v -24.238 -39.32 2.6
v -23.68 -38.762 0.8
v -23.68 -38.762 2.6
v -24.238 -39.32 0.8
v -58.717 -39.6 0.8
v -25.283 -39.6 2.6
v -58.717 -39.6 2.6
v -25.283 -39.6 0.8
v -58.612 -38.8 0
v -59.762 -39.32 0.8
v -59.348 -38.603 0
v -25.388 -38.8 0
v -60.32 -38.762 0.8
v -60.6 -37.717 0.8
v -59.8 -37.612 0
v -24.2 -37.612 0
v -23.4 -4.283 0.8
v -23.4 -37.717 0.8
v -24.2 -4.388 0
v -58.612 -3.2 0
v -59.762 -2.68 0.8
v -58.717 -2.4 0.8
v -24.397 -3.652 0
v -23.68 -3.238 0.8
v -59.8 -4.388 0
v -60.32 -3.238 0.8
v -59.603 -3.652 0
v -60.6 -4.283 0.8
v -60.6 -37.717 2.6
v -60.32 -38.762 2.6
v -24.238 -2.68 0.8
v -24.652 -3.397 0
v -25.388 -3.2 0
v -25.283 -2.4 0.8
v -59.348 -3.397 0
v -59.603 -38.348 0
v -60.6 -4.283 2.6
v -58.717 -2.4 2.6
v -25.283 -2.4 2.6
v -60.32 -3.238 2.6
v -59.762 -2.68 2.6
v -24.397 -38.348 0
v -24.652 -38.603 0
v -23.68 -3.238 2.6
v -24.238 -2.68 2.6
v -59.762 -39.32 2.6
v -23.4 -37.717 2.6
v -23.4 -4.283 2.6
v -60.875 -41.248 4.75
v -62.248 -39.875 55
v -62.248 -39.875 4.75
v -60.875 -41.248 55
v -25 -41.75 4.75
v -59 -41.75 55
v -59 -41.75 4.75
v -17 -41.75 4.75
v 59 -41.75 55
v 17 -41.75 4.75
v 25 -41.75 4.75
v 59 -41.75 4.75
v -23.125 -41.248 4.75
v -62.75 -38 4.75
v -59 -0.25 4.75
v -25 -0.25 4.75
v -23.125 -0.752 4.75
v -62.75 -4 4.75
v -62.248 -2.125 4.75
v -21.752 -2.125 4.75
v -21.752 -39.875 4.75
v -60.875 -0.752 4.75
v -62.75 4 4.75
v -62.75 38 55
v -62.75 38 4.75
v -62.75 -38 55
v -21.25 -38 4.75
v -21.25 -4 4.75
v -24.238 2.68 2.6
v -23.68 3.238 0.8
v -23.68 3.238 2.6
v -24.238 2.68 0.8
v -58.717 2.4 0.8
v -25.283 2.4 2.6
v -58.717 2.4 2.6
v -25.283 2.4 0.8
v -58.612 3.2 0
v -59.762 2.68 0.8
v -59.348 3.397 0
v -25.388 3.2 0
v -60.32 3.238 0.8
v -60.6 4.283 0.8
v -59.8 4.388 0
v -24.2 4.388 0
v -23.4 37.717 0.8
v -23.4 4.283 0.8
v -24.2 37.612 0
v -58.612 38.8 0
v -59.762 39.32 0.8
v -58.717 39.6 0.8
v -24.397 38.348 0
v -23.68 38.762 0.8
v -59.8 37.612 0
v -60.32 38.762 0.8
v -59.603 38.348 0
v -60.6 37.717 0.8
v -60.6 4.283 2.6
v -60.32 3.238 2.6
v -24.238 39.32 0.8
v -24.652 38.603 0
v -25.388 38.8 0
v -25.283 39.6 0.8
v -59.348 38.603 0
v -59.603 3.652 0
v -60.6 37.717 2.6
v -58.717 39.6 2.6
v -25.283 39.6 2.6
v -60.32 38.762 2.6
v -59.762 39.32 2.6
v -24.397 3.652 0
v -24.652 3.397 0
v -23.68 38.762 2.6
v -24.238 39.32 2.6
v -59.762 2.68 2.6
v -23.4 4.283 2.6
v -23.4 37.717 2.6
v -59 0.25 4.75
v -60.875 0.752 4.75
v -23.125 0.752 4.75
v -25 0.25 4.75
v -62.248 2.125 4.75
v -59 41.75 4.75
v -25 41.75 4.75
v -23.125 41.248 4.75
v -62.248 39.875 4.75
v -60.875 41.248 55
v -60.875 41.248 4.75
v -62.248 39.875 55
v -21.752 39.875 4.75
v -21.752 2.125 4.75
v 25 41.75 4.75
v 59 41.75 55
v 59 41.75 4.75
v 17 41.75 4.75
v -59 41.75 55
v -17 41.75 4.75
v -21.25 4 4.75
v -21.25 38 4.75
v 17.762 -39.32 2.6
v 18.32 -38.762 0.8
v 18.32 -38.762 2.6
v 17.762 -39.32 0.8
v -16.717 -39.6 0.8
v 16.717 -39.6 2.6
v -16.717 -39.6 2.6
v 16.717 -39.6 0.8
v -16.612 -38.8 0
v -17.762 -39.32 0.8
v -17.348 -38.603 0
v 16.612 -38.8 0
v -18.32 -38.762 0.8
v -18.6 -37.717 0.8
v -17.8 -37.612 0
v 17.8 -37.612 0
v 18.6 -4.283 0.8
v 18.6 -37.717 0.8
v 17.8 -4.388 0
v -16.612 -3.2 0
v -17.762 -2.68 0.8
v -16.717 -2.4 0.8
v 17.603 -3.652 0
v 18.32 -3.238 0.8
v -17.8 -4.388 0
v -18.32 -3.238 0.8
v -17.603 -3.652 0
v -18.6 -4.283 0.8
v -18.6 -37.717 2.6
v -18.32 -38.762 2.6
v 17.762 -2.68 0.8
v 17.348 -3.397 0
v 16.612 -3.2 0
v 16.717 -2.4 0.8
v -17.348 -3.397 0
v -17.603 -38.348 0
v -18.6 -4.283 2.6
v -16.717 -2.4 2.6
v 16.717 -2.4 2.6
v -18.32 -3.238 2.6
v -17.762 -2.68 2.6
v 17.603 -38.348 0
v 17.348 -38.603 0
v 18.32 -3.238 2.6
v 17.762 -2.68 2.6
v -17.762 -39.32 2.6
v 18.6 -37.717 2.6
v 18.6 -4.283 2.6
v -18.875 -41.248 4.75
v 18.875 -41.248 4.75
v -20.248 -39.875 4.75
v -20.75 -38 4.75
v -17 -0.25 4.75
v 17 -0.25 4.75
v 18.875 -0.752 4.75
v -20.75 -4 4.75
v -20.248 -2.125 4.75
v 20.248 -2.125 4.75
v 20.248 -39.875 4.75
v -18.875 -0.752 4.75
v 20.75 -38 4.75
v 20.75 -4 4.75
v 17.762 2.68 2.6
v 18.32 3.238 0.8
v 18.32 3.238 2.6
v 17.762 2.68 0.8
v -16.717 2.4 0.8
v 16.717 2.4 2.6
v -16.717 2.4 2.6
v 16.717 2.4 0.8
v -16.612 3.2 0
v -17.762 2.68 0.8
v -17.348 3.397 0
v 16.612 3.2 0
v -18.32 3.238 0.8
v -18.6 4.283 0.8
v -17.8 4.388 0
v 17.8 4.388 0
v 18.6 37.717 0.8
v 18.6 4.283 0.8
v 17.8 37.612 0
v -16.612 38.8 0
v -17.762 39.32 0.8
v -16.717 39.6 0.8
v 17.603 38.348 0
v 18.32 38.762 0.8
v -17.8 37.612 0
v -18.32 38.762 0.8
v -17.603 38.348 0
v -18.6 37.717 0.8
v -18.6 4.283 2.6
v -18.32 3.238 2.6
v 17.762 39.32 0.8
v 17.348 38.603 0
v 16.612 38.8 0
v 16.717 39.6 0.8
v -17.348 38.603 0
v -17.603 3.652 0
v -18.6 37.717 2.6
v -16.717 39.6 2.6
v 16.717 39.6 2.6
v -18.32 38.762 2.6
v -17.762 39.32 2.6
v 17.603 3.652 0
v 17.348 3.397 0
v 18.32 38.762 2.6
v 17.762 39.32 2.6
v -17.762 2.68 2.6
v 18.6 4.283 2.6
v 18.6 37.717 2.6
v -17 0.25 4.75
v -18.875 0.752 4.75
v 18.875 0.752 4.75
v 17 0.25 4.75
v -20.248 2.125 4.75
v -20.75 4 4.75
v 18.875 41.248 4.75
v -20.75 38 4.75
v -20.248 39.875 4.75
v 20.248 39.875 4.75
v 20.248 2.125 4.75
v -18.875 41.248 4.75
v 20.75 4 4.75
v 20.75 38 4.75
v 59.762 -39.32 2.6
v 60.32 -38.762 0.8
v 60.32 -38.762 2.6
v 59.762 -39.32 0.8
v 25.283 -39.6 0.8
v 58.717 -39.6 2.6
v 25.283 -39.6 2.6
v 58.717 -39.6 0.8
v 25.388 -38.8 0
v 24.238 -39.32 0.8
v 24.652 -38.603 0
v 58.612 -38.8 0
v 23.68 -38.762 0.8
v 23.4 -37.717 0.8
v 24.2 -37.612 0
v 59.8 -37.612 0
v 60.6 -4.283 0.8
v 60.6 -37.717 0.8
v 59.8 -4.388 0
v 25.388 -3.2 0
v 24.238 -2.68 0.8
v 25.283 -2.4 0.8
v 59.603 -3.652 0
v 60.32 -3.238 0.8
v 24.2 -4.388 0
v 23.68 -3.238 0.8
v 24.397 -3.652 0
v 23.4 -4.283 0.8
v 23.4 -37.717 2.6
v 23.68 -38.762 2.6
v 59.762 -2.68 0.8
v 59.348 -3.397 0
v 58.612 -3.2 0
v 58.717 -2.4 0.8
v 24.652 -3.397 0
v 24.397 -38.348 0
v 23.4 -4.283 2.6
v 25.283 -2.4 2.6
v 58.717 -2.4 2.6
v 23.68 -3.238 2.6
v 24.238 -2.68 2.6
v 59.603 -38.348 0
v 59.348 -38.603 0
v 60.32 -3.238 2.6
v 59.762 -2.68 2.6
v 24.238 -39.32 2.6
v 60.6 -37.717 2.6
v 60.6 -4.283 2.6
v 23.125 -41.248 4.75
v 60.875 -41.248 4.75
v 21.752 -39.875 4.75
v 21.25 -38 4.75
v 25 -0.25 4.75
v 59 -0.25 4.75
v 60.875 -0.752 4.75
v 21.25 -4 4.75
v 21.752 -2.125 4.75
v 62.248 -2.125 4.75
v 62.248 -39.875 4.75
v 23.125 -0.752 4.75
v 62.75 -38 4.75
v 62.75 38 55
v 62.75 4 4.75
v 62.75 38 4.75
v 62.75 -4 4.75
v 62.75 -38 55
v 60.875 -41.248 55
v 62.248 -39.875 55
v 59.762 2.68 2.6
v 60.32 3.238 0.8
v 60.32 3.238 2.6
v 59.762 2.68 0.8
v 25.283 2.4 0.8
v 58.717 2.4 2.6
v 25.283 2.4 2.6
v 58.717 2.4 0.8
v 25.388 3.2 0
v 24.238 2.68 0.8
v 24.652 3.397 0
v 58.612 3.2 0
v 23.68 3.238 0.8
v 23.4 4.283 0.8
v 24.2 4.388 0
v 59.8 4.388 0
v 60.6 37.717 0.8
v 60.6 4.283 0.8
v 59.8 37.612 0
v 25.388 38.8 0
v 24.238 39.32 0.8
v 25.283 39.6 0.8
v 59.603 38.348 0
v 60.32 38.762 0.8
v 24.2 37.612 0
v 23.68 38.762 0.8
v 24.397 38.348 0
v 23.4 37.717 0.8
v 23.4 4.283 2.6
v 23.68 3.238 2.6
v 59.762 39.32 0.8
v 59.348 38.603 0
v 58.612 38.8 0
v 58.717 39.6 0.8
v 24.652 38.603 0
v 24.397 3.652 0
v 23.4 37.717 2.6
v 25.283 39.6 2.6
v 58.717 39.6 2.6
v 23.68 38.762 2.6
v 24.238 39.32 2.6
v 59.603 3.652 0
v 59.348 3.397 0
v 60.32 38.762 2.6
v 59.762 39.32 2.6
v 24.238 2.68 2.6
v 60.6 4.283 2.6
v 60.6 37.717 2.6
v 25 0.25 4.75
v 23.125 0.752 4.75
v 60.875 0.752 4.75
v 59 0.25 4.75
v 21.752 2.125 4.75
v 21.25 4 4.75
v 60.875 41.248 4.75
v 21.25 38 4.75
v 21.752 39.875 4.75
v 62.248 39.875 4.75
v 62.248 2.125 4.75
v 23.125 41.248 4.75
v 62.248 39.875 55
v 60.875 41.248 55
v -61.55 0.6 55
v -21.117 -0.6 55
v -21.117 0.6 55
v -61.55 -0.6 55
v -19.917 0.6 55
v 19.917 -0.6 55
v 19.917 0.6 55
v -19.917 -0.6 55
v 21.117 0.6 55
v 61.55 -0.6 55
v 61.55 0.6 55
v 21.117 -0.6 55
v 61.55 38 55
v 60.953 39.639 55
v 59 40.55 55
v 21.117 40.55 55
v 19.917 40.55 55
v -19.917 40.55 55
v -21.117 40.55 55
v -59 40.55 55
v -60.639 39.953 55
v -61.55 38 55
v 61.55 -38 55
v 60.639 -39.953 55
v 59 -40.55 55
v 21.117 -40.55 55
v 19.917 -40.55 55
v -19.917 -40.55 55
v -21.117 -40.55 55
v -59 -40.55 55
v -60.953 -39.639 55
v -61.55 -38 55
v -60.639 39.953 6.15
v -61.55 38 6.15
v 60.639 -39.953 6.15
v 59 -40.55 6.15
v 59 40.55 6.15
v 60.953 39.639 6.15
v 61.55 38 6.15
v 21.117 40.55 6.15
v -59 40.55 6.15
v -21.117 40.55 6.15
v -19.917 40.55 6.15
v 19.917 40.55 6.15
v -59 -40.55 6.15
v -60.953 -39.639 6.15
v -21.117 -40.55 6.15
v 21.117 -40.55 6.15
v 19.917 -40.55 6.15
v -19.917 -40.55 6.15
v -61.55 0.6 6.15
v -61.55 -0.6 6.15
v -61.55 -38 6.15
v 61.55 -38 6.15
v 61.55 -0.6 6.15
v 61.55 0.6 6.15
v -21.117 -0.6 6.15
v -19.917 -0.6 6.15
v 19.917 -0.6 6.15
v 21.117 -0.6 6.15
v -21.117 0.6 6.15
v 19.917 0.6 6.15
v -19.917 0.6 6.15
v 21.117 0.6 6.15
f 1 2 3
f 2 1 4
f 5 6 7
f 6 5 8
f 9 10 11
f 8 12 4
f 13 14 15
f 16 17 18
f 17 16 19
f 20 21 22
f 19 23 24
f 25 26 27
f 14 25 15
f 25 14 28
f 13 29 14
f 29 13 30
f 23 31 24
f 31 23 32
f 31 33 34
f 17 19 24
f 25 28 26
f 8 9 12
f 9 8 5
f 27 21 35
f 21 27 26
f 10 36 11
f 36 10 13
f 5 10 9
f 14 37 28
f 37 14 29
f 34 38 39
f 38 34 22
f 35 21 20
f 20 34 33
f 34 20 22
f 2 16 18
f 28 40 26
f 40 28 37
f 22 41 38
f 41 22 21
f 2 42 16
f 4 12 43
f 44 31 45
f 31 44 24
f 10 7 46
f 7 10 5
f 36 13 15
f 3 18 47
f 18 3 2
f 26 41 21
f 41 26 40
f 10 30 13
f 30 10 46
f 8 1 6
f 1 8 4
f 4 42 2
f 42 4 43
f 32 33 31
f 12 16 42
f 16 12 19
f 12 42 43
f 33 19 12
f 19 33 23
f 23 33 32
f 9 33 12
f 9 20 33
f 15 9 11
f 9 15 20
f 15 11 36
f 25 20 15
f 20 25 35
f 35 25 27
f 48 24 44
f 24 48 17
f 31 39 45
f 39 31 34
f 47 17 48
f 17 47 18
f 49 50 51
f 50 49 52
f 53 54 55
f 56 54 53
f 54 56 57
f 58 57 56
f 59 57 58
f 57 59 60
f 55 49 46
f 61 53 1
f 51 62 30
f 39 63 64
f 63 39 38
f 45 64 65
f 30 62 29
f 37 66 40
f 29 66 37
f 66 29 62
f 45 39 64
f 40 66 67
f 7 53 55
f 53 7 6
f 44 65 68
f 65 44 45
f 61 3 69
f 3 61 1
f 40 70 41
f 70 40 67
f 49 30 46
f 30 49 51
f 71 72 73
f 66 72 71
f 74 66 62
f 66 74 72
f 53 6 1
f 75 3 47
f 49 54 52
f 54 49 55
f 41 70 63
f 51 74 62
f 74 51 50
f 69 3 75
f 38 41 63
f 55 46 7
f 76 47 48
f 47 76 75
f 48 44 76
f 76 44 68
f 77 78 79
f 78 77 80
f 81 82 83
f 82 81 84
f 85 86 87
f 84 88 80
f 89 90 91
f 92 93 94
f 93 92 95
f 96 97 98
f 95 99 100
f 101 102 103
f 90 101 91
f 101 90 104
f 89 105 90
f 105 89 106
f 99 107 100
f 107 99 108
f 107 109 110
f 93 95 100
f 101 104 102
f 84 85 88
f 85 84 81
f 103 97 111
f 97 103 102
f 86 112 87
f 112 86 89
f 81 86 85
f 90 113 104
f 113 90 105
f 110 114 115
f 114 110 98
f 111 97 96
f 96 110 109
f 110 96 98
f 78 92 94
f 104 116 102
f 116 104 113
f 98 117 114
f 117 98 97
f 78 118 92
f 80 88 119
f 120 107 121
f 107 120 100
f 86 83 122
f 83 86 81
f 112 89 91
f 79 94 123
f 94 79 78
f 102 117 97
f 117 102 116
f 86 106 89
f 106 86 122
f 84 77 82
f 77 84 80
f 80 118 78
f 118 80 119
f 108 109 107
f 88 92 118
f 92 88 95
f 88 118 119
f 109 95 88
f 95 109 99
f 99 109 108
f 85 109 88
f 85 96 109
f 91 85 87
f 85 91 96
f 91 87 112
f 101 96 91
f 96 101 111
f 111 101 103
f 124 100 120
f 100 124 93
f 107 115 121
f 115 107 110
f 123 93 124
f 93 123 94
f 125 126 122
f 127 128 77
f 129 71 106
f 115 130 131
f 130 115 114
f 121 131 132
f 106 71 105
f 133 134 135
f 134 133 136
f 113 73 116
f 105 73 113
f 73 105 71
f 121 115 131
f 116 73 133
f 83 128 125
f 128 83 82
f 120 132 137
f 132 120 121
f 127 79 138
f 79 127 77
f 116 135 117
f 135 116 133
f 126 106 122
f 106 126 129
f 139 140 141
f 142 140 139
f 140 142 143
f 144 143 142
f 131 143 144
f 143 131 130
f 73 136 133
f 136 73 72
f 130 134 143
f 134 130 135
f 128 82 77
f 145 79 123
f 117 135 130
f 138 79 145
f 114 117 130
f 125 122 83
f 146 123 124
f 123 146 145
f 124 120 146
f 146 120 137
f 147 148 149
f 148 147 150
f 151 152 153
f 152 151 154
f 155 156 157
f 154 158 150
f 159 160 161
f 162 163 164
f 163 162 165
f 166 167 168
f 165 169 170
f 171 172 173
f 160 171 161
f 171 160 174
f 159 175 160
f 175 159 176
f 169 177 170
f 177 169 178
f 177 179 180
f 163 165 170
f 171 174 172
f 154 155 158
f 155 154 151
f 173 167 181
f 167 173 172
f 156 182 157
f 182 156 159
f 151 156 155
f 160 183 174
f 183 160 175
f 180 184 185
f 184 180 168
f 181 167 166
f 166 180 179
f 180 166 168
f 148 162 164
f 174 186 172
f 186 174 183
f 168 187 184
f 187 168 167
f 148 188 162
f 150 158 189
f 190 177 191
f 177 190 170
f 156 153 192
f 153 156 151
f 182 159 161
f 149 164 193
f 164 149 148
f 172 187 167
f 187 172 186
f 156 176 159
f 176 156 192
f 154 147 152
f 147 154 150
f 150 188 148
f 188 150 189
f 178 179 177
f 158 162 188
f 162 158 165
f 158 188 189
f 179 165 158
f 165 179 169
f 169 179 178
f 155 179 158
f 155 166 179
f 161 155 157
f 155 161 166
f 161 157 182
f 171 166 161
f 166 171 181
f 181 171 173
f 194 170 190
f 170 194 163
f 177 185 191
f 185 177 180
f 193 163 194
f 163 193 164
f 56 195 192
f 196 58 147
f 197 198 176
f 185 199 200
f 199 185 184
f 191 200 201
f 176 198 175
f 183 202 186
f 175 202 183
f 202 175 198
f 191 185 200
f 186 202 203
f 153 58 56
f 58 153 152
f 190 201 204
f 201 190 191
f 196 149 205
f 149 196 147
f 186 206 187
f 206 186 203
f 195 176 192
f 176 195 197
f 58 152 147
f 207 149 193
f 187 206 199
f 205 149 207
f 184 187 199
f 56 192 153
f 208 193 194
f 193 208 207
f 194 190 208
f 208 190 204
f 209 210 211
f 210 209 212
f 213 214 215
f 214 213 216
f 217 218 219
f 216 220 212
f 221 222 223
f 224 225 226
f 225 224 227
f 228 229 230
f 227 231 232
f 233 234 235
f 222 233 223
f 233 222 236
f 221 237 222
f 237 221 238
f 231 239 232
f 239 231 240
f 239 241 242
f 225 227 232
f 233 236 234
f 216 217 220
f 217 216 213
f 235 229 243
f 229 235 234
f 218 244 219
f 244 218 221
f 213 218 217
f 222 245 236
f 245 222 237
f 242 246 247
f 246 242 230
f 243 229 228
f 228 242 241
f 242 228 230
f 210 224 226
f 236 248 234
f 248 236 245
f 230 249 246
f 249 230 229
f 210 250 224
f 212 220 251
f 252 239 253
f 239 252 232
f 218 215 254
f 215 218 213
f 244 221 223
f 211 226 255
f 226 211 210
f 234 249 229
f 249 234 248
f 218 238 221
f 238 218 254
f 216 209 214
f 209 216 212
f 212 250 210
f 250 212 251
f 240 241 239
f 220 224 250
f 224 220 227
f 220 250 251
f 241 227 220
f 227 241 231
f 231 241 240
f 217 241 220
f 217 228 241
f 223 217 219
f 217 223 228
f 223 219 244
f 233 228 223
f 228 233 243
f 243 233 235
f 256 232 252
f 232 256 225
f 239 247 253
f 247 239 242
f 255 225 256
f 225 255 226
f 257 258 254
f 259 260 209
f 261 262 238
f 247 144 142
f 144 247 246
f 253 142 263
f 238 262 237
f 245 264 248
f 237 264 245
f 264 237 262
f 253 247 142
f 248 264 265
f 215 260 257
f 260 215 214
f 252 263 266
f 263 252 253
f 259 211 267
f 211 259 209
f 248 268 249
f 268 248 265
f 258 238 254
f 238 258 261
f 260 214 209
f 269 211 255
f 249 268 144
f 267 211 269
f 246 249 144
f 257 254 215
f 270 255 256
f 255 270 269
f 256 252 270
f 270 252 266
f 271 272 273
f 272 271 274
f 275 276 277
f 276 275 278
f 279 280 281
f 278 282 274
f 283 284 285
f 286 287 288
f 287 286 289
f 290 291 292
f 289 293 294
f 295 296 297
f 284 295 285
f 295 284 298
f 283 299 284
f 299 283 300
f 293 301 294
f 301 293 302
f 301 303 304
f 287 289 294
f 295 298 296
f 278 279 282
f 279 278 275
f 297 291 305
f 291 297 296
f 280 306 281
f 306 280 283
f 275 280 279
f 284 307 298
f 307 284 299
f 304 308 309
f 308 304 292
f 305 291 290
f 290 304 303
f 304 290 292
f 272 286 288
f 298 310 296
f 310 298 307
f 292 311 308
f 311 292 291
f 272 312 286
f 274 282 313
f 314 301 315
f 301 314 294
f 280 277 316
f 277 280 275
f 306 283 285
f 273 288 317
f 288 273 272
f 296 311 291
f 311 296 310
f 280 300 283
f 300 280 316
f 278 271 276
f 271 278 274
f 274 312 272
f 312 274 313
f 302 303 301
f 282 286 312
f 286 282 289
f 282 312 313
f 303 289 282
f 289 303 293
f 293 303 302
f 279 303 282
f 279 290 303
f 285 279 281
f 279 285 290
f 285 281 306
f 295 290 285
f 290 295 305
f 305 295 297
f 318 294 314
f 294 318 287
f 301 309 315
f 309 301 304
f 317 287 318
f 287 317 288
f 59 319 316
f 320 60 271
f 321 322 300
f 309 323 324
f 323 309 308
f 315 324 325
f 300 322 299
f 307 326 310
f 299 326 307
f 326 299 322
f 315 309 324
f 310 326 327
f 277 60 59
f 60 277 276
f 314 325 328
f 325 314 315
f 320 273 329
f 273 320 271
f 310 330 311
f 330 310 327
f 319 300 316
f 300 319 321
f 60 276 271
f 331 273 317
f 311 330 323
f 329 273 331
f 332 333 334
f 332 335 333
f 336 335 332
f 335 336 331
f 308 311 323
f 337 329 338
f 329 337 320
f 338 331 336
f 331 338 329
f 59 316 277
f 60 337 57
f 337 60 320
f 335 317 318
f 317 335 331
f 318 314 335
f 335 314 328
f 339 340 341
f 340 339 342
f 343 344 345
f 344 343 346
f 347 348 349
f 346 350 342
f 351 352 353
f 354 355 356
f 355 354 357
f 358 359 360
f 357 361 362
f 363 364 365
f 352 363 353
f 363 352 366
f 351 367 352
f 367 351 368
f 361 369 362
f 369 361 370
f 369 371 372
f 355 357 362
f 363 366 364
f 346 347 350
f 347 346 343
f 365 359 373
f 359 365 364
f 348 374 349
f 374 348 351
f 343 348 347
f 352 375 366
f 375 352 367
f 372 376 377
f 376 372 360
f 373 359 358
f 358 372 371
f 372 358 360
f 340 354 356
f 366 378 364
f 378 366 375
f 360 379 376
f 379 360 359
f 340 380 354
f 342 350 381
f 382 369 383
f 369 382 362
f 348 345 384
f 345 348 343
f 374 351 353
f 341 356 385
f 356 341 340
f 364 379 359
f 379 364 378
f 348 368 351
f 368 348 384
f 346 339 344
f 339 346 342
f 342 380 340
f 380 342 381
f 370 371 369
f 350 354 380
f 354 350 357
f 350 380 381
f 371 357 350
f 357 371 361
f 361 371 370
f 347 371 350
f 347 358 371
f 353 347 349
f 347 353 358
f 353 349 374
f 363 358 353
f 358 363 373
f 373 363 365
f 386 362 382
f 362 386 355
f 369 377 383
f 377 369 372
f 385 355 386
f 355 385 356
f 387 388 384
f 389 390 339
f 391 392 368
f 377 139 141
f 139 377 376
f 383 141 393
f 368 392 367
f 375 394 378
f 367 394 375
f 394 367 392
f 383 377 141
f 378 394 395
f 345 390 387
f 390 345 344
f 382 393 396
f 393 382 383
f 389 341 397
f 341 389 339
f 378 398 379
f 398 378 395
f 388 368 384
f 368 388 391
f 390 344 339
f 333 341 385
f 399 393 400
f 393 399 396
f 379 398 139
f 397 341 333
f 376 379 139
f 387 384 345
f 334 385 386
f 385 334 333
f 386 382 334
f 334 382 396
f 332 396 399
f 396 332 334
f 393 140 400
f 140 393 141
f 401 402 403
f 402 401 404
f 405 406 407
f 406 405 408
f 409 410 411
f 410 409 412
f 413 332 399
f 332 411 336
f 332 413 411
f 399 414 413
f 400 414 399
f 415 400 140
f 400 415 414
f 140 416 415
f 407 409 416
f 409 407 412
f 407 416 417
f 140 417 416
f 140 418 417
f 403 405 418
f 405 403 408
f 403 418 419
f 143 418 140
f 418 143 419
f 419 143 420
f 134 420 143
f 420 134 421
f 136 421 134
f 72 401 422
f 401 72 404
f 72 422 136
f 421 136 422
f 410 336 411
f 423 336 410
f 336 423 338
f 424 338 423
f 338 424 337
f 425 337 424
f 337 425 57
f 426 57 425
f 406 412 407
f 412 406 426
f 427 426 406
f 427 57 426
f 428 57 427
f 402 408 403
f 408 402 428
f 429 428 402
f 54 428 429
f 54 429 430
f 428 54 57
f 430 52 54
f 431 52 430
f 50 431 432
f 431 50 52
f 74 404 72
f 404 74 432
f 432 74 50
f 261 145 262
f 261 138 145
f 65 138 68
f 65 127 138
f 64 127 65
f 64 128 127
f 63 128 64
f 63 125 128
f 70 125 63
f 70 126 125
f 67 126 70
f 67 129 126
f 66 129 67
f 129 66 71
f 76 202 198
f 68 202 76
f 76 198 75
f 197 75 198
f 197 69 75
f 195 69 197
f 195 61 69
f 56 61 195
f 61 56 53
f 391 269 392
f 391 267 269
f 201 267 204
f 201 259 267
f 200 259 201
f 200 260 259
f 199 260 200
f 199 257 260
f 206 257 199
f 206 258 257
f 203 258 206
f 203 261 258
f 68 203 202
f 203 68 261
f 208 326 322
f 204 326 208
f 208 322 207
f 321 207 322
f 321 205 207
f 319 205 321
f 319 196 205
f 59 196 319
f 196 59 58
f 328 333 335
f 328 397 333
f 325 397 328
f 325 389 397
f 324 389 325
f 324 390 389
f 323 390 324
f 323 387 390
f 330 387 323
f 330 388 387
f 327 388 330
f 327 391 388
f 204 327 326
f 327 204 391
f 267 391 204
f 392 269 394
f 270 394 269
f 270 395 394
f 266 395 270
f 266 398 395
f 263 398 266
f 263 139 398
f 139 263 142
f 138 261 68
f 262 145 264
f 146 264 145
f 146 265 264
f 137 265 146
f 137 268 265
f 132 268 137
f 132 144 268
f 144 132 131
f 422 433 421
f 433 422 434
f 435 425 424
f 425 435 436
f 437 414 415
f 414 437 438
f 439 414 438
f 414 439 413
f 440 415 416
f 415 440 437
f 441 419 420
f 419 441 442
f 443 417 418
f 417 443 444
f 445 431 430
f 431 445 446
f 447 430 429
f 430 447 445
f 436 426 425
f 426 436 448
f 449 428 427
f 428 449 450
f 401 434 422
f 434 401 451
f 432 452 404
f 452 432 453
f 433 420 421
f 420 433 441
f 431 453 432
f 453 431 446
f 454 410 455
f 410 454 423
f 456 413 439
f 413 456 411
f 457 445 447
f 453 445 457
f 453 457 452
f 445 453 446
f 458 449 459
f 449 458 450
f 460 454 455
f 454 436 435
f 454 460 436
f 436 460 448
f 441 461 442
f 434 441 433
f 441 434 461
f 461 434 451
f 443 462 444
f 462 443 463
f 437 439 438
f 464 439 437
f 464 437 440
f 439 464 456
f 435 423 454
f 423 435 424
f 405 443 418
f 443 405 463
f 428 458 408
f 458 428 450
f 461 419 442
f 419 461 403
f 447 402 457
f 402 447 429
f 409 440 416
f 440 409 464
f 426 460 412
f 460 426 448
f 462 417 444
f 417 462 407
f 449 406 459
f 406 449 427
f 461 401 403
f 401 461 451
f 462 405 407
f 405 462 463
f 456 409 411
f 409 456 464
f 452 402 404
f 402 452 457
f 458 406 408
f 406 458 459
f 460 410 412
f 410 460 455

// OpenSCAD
// file: ../lib/gridfinity.scad
// gridfinity.scad — shared Gridfinity baseplate + bin library (per spec).
//
// 42 mm pitch, 41.5 mm bins, baseplate socket 0.7/1.8/2.15 = 4.65 mm, 4 mm
// fillet; bin foot 0.8/1.8/2.15 = 4.75 mm, 3.75 mm corner radius. Verified the
// bin foot seats in the baseplate socket with ~0.25–0.5 mm clearance.
//
//   baseplate(nx, ny)                      — tiled receiving baseplate
//   bin(nx, ny, h, wall, floor)            — open Gridfinity bin
//   divided_bin(nx, ny, h, cols, rows, …)  — bin with internal compartments

GF = 42; GF_FILLET = 4;
_C_TOP = 2.15; _C_MID = 1.8; _C_BOT = 0.7;
_BP_LIP = _C_TOP + _C_MID + _C_BOT; _BP_FLOOR = 1.2; BP_H = _BP_LIP + _BP_FLOOR;  // 5.85
BIN_SZ = 41.5; BIN_R = 3.75; BIN_BASE_H = 4.75;

// ---- baseplate ----
module _bp_cell(i = 0) { offset(r = -i) offset(r = GF_FILLET) offset(r = -GF_FILLET) square(GF, center = true); }
module _bp_socket() {
    e = 0.01;
    hull() { translate([0,0,BP_H-e]) linear_extrude(e) _bp_cell(0); translate([0,0,BP_H-_C_TOP]) linear_extrude(e) _bp_cell(_C_TOP); }
    translate([0,0,BP_H-_C_TOP-_C_MID]) linear_extrude(_C_MID) _bp_cell(_C_TOP);
    hull() { translate([0,0,BP_H-_C_TOP-_C_MID-e]) linear_extrude(e) _bp_cell(_C_TOP); translate([0,0,BP_H-_BP_LIP]) linear_extrude(e) _bp_cell(_C_TOP+_C_BOT); }
}
module baseplate(nx, ny) {
    w = nx*GF; d = ny*GF;
    difference() {
        translate([0,0,BP_H/2]) linear_extrude(BP_H, center=true) offset(GF_FILLET) offset(-GF_FILLET) square([w,d], center=true);
        for (ix=[0:nx-1], iy=[0:ny-1]) translate([(ix-(nx-1)/2)*GF, (iy-(ny-1)/2)*GF, 0]) _bp_socket();
    }
}

// ---- bin ----
module _bin_cell(i = 0) { offset(r = -i) offset(r = BIN_R) offset(r = -BIN_R) square(BIN_SZ, center = true); }
module _bin_foot() {
    e = 0.01;
    hull() { linear_extrude(e) _bin_cell(2.95); translate([0,0,0.8]) linear_extrude(e) _bin_cell(2.15); }    // bottom chamfer
    translate([0,0,0.8]) linear_extrude(1.8) _bin_cell(2.15);                                                 // vertical
    hull() { translate([0,0,2.6]) linear_extrude(e) _bin_cell(2.15); translate([0,0,BIN_BASE_H]) linear_extrude(e) _bin_cell(0); } // top chamfer
}
module _bin_shell(nx, ny, h, wall, floor) {
    W = nx*GF - 0.5; D = ny*GF - 0.5;
    difference() {
        union() {
            for (ix=[0:nx-1], iy=[0:ny-1]) translate([(ix-(nx-1)/2)*GF, (iy-(ny-1)/2)*GF, 0]) _bin_foot();
            translate([0,0,BIN_BASE_H]) linear_extrude(h-BIN_BASE_H) offset(BIN_R) offset(-BIN_R) square([W,D], center=true);
        }
        translate([0,0,BIN_BASE_H+floor]) linear_extrude(h) offset(BIN_R-wall) offset(-(BIN_R-wall)) square([W-2*wall, D-2*wall], center=true);
    }
}
module bin(nx, ny, h, wall = 1.2, floor = 1.4) { _bin_shell(nx, ny, h, wall, floor); }

module divided_bin(nx, ny, h, cols = 1, rows = 1, wall = 1.2, floor = 1.4, div = 1.2) {
    W = nx*GF - 0.5; D = ny*GF - 0.5;
    union() {
        bin(nx, ny, h, wall, floor);
        // internal divider walls (from the floor up to the rim)
        iw = W - 2*wall; id = D - 2*wall; z0 = BIN_BASE_H + floor;
        for (c = [1 : cols-1]) translate([-iw/2 + c*iw/cols - div/2, -id/2, z0]) cube([div, id, h - z0]);
        for (r = [1 : rows-1]) translate([-iw/2, -id/2 + r*id/rows - div/2, z0]) cube([iw, div, h - z0]);
    }
}
// file: apache_organizer_common.scad
// apache_organizer_common.scad — shared bits for the Apache 5800 cord organizer.
//
// Case interior: 514 × 289 × 144 mm. The floor is a 12 × 6 Gridfinity grid
// (504 × 252) printed as two 6 × 6 tiles; the ~37 mm spare on one long side is
// a cable channel, ~5 mm border at each end. Tiles butt and the case walls hold
// them; 2 alignment pegs per mating edge keep them flush and slide-together.

include <../lib/gridfinity.scad>

TILE_NX = 6; TILE_NY = 6;       // each tile (252 × 252)
PEG_D = 3.5; PEG_L = 6; PEG_Y = 60;

// Tile with alignment pegs on +X edge and matching holes on -X edge, so two
// identical tiles chain along the case length.
module organizer_tile() {
    w = TILE_NX * GF;            // 252
    difference() {
        union() {
            baseplate(TILE_NX, TILE_NY);
            for (y = [PEG_Y, -PEG_Y]) translate([w/2, y, BP_H/2]) rotate([0,90,0]) cylinder(d = PEG_D, h = PEG_L); // +X pegs
        }
        for (y = [PEG_Y, -PEG_Y]) translate([-w/2 - 0.1, y, BP_H/2]) rotate([0,90,0]) cylinder(d = PEG_D + 0.4, h = PEG_L + 1); // -X holes
    }
}
// main file
// bin_interconnect — 3×2 bin divided into a 3×2 grid for small interconnect cords.
include <apache_organizer_common.scad>
divided_bin(3, 2, 55, cols = 3, rows = 2);
